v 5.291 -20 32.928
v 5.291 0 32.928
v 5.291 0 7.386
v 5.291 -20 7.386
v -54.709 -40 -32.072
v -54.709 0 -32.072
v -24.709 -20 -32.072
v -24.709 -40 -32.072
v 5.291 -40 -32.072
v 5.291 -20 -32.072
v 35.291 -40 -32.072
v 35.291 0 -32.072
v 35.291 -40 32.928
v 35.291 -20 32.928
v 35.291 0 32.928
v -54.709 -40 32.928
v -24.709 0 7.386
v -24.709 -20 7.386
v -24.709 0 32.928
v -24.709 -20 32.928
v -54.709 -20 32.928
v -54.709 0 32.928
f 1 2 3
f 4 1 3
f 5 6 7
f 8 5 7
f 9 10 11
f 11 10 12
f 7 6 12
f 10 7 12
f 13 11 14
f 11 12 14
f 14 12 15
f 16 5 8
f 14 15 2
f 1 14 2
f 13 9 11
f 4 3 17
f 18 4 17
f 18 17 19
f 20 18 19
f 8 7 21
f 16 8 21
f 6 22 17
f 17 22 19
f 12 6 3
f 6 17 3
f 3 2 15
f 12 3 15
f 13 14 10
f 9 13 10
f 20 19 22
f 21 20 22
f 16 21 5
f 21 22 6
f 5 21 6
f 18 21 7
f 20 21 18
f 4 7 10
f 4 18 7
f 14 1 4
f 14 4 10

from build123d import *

# Parameters (mm, degrees)
F1_DEPTH = 20
F3_DEPTH = 20
F5_DEPTH = 20


with BuildPart() as f1:
    # F0 (on Front) → F1 (new body)
    with BuildSketch(Plane.XZ):
        Polygon((-24.709278, 32.928156), (-54.709278, 32.928156), (-54.709278, -32.071844), (35.290722, -32.071844), (35.290722, 32.928156), (5.290722, 32.928156), (5.290722, 7.385719), (-24.709278, 7.385719), align=None)
    extrude(amount=F1_DEPTH)

    # F2 (on face) → F3 (join)
    with BuildSketch(Plane.XZ.offset(20)):
        Polygon((-54.709278, 32.928156), (-54.709278, -32.071844), (-24.709278, -32.071844), align=None)
    extrude(amount=F3_DEPTH)

    # F4 (on face) → F5 (join)
    with BuildSketch(Plane.XZ.offset(20)):
        Polygon((5.290722, -32.071844), (35.290722, -32.071844), (35.290722, 32.928156), align=None)
    extrude(amount=F5_DEPTH)


solid = f1.part
